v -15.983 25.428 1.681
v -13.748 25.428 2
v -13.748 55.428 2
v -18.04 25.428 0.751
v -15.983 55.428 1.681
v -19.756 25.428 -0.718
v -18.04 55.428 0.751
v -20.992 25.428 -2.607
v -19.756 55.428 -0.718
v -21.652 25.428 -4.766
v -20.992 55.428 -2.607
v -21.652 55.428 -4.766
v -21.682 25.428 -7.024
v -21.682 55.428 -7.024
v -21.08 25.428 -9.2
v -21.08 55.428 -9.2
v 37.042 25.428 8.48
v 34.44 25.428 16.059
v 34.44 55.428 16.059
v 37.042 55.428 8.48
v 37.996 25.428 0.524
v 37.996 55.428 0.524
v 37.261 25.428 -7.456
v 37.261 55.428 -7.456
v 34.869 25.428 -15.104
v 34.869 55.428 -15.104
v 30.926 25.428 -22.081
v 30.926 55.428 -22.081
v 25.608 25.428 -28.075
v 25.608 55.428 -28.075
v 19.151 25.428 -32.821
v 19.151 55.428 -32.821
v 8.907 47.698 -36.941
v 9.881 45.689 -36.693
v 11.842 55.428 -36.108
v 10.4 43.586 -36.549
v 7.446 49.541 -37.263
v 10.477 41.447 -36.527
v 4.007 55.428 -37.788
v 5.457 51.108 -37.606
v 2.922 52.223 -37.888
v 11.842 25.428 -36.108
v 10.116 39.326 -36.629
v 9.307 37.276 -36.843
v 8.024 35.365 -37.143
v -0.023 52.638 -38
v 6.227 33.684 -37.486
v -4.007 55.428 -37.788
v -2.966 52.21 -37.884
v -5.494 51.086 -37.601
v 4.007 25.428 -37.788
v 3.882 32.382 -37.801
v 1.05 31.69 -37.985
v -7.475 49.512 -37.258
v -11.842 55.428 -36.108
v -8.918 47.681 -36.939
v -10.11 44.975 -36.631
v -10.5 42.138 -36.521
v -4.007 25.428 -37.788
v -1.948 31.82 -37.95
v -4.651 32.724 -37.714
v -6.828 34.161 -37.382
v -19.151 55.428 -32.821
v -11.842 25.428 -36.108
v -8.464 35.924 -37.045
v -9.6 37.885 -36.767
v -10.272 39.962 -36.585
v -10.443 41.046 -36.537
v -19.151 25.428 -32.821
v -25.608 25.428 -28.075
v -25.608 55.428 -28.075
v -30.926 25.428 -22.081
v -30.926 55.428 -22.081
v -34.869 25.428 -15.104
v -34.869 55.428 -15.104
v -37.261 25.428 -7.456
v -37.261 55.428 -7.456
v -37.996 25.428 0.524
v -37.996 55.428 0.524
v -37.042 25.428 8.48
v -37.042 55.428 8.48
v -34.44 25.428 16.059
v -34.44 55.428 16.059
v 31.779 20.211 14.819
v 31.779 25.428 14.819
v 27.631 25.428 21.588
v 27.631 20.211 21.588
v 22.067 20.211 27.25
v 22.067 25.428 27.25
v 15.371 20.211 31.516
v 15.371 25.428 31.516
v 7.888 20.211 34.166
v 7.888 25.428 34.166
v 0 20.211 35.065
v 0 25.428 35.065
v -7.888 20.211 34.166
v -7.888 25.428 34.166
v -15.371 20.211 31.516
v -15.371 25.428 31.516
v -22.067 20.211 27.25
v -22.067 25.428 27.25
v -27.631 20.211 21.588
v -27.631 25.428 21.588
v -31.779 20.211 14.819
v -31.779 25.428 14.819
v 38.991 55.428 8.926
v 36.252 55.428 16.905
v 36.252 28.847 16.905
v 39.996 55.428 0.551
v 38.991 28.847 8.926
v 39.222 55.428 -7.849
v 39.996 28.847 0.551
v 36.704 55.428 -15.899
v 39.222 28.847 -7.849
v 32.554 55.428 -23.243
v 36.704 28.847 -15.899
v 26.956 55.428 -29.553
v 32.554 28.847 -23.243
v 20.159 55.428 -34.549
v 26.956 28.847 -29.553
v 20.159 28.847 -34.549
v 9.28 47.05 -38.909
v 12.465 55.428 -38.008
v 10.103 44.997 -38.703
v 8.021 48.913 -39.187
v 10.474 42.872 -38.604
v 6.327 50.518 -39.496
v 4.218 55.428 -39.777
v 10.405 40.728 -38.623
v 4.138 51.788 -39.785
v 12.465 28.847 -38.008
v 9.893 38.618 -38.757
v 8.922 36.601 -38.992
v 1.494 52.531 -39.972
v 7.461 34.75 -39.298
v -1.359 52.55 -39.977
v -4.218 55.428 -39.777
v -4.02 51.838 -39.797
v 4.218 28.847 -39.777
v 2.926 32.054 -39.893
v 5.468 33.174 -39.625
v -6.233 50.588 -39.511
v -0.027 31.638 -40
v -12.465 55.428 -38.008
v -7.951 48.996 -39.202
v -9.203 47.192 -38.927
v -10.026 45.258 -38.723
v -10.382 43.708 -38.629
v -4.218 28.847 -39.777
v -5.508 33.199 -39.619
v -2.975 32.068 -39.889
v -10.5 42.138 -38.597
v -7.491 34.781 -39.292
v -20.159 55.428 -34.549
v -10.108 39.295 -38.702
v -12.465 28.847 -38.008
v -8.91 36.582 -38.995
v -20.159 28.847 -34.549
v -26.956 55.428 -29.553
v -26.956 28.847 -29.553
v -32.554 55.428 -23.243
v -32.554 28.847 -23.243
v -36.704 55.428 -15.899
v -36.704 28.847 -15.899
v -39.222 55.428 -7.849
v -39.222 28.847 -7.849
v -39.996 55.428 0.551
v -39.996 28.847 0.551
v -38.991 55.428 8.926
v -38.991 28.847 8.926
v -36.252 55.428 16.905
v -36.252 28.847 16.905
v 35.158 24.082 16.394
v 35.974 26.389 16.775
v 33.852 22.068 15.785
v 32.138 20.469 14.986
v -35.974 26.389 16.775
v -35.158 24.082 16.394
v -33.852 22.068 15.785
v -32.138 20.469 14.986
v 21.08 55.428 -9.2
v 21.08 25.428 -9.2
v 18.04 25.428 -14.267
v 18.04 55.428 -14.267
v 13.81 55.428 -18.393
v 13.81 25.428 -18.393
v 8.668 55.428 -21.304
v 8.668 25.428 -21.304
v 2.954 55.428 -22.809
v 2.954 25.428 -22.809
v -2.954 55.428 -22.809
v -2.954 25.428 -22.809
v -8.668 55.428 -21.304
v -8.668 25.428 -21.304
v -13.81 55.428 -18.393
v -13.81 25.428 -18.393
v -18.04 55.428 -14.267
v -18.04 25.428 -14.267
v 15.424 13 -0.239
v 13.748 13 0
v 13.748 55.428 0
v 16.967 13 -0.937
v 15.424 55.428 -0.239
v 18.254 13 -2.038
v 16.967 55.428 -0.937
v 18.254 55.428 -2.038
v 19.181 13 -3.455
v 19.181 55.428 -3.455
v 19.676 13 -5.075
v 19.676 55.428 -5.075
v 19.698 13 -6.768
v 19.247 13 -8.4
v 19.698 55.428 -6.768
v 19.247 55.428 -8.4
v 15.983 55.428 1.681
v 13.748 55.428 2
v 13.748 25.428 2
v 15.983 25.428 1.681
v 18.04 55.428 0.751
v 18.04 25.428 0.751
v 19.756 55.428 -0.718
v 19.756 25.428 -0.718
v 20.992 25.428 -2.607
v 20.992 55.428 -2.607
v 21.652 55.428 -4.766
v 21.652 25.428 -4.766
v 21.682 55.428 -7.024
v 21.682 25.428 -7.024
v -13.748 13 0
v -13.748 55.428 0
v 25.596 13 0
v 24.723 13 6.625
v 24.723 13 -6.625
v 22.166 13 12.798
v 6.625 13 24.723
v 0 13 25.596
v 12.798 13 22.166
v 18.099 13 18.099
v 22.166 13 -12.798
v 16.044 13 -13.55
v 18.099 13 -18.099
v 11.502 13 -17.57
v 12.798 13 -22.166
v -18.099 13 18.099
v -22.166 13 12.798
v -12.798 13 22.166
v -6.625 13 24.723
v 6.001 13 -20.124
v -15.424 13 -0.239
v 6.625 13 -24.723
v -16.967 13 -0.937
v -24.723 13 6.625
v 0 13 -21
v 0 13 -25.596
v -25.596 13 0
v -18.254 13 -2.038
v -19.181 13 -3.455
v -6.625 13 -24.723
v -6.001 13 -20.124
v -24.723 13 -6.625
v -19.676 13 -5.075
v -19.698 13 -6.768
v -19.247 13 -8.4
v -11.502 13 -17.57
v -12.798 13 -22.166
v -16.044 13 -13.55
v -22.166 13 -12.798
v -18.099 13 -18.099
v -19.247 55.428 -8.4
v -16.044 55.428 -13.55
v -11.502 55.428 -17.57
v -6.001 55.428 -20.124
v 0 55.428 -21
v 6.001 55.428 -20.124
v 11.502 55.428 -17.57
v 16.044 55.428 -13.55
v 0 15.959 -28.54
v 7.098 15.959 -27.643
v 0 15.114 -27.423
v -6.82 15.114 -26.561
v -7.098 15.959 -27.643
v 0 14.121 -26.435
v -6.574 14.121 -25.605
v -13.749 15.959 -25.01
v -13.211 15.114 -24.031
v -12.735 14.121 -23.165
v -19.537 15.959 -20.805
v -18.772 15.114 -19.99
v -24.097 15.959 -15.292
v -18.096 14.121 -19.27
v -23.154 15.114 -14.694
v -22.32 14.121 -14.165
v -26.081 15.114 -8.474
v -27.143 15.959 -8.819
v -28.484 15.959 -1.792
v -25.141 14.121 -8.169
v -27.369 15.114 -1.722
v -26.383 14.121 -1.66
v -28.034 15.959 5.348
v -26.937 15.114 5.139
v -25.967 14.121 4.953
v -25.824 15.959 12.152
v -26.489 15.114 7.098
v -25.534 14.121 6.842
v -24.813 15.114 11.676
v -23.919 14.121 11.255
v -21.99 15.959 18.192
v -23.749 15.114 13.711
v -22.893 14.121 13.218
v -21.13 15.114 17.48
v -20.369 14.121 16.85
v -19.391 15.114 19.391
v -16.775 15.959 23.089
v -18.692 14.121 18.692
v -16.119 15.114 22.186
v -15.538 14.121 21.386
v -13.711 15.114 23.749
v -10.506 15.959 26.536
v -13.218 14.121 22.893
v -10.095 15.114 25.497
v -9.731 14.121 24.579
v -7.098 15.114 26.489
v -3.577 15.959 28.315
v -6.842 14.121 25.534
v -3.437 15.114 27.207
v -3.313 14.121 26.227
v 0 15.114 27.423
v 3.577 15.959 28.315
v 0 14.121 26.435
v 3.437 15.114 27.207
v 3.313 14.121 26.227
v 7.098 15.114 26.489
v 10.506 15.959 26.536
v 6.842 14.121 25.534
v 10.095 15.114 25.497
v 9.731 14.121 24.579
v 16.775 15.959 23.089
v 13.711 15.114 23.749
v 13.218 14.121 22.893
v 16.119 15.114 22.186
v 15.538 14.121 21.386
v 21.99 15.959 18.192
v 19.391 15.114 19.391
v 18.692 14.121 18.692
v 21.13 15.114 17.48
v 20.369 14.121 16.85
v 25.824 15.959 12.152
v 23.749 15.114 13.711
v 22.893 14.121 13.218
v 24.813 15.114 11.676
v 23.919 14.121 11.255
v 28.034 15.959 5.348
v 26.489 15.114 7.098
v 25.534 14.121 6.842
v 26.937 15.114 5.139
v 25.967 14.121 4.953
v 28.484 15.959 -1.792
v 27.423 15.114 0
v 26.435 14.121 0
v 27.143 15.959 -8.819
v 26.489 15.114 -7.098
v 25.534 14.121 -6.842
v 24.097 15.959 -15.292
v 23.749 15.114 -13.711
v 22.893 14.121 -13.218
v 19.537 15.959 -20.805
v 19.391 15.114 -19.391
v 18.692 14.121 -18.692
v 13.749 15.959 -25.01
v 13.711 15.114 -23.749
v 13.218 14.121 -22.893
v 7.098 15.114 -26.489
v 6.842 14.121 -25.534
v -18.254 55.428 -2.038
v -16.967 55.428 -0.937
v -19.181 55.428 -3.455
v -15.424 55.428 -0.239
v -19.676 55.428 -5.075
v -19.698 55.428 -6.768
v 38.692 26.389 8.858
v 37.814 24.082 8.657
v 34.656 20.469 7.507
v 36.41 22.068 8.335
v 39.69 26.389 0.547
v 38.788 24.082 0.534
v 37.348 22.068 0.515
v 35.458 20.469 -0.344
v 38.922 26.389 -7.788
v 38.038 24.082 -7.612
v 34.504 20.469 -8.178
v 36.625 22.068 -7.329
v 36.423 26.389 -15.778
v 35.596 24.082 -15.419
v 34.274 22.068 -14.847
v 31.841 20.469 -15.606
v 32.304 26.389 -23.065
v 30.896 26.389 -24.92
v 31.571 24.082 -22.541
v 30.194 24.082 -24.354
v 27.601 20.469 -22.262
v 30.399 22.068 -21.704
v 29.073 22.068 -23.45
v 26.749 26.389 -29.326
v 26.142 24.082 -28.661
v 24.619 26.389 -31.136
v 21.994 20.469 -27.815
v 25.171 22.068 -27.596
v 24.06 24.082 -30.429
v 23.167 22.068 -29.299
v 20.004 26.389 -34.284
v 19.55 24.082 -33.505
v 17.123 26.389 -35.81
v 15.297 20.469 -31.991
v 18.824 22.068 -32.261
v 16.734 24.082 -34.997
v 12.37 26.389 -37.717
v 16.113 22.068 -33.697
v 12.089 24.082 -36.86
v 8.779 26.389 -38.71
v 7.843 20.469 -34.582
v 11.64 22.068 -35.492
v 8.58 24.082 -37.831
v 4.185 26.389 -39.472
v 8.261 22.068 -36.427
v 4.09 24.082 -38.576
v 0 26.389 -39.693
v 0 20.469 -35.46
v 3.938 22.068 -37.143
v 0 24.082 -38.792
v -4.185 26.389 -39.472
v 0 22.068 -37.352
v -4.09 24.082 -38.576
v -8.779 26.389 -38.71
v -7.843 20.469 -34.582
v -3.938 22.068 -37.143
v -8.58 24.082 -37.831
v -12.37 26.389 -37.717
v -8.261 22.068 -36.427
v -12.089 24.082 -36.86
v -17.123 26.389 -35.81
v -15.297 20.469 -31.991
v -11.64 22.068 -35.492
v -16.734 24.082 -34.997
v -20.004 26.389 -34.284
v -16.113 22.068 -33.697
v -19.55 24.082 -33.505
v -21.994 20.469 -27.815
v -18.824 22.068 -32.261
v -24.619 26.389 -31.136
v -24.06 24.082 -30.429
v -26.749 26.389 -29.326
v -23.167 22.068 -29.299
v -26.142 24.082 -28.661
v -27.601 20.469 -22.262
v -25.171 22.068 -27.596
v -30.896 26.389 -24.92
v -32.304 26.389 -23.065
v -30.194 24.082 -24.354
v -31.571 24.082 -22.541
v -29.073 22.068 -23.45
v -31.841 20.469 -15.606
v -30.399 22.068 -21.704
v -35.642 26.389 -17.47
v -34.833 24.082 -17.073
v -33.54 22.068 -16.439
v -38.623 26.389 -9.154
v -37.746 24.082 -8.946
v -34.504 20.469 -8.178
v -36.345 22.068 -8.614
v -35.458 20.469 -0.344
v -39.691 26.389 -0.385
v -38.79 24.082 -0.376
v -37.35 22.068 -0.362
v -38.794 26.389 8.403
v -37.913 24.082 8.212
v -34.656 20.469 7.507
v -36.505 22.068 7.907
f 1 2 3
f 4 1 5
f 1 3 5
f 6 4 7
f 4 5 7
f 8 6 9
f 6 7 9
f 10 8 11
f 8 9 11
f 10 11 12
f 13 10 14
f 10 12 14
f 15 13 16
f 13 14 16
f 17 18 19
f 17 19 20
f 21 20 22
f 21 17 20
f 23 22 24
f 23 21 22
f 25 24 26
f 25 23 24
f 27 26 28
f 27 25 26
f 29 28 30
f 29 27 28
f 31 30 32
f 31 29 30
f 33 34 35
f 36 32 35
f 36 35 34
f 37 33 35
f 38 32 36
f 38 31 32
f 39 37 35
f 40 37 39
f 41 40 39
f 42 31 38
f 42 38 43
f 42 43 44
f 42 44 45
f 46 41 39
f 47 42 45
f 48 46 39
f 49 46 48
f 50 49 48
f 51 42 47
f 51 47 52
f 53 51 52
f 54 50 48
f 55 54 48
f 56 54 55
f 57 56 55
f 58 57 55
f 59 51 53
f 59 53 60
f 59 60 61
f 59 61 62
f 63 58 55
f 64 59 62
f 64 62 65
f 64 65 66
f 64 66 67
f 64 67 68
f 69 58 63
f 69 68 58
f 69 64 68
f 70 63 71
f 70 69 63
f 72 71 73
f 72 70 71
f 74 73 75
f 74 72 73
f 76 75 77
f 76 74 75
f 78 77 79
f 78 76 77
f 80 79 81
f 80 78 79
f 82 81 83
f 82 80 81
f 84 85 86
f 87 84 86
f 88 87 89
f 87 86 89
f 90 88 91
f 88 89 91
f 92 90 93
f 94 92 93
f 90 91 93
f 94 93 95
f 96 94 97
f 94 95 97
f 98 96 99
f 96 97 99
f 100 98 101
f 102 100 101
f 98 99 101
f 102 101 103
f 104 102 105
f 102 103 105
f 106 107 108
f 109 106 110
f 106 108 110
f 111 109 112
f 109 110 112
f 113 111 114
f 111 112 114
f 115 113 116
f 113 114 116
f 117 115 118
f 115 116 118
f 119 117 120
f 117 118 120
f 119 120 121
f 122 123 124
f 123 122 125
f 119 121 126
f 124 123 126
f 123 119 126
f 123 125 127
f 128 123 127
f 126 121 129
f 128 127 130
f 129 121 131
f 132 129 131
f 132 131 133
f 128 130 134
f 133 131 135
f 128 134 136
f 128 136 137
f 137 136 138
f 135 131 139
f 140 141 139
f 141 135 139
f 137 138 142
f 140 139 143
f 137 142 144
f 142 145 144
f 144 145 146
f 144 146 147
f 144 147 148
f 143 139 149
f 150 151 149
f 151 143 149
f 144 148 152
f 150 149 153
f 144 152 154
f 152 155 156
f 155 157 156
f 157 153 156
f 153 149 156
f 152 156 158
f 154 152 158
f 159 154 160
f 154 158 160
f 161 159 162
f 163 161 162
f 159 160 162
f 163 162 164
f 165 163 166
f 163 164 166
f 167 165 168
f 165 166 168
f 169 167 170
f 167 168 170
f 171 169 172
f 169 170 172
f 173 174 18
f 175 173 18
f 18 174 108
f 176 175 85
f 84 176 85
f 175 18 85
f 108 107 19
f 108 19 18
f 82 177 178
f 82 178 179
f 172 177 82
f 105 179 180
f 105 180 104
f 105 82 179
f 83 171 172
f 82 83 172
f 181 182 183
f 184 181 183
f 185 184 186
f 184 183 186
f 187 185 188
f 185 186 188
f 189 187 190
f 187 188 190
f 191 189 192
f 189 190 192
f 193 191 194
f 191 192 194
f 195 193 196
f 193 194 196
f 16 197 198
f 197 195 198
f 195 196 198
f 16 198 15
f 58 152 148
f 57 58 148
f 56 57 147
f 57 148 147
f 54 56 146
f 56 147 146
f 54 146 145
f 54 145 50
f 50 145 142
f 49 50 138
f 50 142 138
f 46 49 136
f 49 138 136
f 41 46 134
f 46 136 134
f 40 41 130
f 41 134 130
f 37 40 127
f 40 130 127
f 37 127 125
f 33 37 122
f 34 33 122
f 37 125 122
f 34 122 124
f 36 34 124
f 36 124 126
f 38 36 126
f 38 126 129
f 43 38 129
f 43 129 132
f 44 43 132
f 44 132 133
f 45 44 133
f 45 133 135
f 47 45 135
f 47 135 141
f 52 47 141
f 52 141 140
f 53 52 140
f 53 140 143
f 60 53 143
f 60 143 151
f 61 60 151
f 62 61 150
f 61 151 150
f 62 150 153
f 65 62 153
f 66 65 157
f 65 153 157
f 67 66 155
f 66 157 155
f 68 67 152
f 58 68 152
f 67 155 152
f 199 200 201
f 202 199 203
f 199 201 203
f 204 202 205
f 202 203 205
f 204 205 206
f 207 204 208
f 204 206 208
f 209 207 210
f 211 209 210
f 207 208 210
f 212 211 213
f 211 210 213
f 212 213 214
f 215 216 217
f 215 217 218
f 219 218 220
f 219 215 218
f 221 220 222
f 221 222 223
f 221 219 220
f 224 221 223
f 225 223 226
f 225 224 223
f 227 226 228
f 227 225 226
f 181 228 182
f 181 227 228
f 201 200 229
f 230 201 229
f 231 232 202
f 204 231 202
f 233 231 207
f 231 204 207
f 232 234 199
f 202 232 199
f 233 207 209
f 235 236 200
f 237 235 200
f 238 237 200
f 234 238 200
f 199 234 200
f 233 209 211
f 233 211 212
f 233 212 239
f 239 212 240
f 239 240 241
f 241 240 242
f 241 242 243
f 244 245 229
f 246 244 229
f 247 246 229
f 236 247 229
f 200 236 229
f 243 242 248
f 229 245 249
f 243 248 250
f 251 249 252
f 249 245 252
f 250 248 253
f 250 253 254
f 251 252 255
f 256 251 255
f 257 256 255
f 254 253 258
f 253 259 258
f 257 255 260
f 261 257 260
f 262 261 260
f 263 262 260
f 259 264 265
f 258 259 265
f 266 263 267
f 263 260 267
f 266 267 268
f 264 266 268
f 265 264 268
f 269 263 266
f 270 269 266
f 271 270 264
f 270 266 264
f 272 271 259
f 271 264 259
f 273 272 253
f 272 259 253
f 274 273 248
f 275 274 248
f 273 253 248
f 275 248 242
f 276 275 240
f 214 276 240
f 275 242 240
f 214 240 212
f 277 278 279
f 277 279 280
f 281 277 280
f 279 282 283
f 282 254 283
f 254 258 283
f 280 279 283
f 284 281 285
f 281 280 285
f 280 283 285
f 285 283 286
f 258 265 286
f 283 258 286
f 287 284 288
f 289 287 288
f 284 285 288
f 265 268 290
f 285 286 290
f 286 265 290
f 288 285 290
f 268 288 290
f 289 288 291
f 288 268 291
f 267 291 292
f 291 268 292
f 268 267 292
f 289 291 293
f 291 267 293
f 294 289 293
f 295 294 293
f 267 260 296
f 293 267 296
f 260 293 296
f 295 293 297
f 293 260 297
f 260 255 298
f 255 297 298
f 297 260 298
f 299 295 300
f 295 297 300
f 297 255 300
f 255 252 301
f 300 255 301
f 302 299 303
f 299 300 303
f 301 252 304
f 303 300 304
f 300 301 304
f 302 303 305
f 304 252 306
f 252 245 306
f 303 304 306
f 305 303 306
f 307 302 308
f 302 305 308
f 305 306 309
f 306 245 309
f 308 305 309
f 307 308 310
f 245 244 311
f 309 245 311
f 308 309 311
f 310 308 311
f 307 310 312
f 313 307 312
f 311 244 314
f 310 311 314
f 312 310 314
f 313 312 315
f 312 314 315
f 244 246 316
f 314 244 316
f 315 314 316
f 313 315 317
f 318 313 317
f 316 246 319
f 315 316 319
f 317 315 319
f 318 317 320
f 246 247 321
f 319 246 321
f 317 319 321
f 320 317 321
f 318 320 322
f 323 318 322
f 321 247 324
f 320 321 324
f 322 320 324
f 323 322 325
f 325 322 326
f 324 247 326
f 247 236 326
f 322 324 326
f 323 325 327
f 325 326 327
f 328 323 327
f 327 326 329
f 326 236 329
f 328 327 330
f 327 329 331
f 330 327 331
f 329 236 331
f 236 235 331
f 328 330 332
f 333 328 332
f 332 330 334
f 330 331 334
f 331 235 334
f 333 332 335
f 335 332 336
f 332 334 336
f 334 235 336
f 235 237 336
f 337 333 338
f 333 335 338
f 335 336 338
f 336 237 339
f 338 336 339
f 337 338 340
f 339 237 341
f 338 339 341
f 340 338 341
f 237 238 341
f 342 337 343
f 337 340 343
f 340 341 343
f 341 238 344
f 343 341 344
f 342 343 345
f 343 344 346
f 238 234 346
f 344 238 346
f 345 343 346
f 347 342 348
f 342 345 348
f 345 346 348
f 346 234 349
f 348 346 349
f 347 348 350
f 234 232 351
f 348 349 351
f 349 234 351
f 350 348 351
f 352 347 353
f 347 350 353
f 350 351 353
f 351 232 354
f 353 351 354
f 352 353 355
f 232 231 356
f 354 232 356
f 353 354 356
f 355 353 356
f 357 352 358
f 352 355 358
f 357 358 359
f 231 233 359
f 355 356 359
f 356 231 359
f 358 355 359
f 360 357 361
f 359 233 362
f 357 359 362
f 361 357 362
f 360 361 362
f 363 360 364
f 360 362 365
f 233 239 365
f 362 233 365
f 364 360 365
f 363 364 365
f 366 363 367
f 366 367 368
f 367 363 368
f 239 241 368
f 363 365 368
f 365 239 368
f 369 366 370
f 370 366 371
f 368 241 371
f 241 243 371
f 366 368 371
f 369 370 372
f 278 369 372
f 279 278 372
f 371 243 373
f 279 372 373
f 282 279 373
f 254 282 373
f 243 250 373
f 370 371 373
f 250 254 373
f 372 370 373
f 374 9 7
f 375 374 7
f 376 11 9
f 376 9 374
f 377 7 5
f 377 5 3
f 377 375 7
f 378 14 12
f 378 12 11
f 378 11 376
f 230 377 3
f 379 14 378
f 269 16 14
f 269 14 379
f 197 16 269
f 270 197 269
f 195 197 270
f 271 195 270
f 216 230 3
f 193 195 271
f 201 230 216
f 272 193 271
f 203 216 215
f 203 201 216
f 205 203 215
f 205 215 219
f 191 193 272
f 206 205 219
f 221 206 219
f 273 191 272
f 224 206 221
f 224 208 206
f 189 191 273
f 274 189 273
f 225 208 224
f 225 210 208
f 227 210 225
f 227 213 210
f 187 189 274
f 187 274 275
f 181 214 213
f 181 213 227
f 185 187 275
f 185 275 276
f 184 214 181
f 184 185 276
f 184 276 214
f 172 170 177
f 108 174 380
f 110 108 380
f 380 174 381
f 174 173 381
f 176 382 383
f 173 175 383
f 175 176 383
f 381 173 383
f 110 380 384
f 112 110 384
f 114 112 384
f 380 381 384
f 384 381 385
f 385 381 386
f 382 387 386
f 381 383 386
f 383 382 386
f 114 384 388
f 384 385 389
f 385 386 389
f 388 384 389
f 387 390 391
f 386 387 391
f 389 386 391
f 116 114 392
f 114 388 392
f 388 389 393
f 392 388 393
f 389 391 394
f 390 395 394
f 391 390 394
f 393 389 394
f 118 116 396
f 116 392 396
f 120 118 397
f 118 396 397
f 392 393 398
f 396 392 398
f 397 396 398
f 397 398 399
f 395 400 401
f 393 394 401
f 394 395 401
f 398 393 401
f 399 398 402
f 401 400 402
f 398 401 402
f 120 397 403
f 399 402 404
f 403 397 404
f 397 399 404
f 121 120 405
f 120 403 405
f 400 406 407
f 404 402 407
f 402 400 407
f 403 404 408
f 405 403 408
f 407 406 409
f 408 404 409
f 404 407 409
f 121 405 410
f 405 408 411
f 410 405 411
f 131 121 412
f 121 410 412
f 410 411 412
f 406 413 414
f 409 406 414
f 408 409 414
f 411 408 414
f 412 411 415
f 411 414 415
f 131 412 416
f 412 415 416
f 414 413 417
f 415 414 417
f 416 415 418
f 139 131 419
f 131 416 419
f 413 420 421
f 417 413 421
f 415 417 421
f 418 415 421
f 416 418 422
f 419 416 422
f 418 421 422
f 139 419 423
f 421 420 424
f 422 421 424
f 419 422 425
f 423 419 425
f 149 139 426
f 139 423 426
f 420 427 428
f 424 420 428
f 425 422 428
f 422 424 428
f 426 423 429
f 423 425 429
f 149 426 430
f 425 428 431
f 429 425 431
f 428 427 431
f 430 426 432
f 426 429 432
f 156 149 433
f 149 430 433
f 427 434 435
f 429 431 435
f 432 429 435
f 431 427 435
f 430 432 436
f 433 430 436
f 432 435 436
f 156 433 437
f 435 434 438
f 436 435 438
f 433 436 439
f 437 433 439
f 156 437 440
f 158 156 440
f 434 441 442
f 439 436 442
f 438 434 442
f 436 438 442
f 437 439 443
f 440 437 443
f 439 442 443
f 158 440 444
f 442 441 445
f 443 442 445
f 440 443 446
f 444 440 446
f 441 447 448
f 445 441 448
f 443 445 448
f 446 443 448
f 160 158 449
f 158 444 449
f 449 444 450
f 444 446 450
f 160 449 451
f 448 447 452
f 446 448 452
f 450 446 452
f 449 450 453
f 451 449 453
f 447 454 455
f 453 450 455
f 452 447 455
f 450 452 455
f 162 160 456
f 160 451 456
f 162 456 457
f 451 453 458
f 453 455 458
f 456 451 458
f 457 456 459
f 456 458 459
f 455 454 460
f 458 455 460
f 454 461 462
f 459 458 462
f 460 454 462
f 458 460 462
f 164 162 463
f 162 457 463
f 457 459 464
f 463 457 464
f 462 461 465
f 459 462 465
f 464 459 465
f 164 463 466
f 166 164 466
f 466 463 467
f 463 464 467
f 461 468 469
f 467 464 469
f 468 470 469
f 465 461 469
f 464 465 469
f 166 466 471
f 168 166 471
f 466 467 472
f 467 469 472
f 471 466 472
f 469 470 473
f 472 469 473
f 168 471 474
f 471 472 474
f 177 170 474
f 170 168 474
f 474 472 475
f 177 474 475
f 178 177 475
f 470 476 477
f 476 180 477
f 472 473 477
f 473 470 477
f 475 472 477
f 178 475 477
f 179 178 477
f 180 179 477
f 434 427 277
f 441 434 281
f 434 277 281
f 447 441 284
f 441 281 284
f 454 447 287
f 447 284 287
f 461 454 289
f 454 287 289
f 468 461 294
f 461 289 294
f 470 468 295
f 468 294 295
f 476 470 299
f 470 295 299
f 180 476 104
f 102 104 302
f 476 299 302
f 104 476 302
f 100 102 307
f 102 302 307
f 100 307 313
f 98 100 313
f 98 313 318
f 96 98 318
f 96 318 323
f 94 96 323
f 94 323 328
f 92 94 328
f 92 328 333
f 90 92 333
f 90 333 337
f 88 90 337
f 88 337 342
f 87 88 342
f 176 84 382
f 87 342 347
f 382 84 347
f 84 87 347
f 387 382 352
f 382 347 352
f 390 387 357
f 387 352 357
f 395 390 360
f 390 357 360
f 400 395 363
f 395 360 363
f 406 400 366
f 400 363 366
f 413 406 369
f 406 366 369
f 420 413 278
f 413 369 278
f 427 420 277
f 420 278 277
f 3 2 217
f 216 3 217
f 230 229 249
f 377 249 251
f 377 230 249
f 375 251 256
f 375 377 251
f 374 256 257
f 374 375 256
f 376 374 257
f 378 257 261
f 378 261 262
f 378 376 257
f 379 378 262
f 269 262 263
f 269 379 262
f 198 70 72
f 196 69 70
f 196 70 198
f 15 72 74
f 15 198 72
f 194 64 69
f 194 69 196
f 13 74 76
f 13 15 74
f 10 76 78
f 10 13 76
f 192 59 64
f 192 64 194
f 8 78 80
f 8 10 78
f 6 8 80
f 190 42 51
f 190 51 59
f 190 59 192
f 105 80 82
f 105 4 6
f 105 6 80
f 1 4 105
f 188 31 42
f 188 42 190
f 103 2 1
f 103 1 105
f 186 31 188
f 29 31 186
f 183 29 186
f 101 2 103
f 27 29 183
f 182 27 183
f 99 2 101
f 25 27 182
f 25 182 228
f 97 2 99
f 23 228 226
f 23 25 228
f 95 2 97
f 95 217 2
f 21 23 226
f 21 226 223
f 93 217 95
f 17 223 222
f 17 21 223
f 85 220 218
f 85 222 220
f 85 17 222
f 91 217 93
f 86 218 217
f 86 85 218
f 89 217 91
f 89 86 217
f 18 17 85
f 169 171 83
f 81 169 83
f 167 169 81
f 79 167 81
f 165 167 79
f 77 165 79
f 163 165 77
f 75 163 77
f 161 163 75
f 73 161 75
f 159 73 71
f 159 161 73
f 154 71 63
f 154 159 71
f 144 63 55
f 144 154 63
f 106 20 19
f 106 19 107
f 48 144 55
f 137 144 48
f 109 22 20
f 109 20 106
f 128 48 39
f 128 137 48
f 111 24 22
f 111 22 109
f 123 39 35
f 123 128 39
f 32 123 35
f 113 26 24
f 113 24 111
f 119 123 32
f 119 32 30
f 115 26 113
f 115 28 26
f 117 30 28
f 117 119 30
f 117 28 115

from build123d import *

# Parameters (mm, degrees)
CUT_EXTRUDE3_DEPTH           = 60
CUT_EXTRUDE5_DEPTH           = 2
CUT_EXTRUDE5_DEPTH_BACK      = 30
SKETCH9_R                    = 38
SKETCH9_R_2                  = 23
SKETCH19_W                   = 12
SKETCH19_H                   = 36.5
CUT_REVOLVE2_ANGLE           = 65
CUT_REVOLVE2_OTHER_WAY_ANGLE = 65
SKETCH21_W                   = 3.25
SKETCH21_H                   = 4
BOSS_EXTRUDE3_DEPTH          = 1.35
CIRPATTERN1_COUNT            = 5
CUT_EXTRUDE9_START           = -5
CUT_EXTRUDE9_DEPTH           = 5
SKETCH23_R                   = 10.5
CUT_EXTRUDE10_DEPTH          = 10
SKETCH24_W                   = 15
SKETCH24_H                   = 8
BOSS_EXTRUDE4_DEPTH          = 8
SKETCH26_W                   = 10
SKETCH26_H                   = 6
CUT_EXTRUDE11_DEPTH          = 10
SKETCH27_W                   = 4
SKETCH27_H                   = 5
CUT_EXTRUDE12_DEPTH          = 5
CUT_EXTRUDE14_DEPTH          = 2
CUT_EXTRUDE14_DEPTH_BACK     = 30
SKETCH29_R                   = 1
CUT_EXTRUDE15_DEPTH          = 15
FILLET1_R                    = 6
FILLET2_R                    = 8
INTERSECT2_START             = 55.427876097
INTERSECT2_OUTLINE_W         = 10
INTERSECT2_OUTLINE_H         = 6
INTERSECT2_DEPTH             = 8
INTERSECT2_2_DEPTH           = 13
INTERSECT2_START_2           = 50.427876097
INTERSECT2_3_OUTLINE_W       = 15
INTERSECT2_3_OUTLINE_H       = 8
INTERSECT2_3_OUTLINE_W_2     = 10
INTERSECT2_3_OUTLINE_H_2     = 6
INTERSECT2_3_DEPTH           = 5


# Read off the part's stored shape, not the designer's step: Cut-Extrude9, Intersect2
with BuildPart() as part:
    # Sketch1 → Revolve1 (revolve)
    with BuildSketch(Plane.XY, mode=Mode.PRIVATE) as revolve1_sk:
        with BuildLine():
            Line((0, 63.427876097), (32, 63.427876097))
            ThreePointArc((32, 63.427876097), (37.656854249, 61.084730346), (40, 55.427876097))
            Line((40, 55.427876097), (40, 28.846818009))
            ThreePointArc((40, 28.846818009), (38.792081772, 24.082439968), (35.460140376, 20.469057744))
            Line((35.460140376, 20.469057744), (28.539859624, 15.958818353))
            ThreePointArc((28.539859624, 15.958818353), (25.207918228, 12.345436129), (24, 7.581058088))
            Line((24, 7.581058088), (24, 3.25))
            Line((24, 3.25), (24.35, 3))
            Line((24.35, 3), (24.35, 0))
            Line((24.35, 0), (22.5, 0))
            Line((22.5, 0), (22.5, 12.5))
            ThreePointArc((22.5, 12.5), (22.353553391, 12.853553391), (22, 13))
            Line((22, 13), (0, 13))
            Line((0, 13), (0, 63.427876097))
        make_face()
    revolve(revolve1_sk.sketch.rotate(Axis((0, 0, 0), (0, 1, 0)), 90), axis=Axis((0, 0, 0), (0, 1, 0)))

    # Sketch11 → Cut-Extrude3 (cut)
    with BuildSketch(Plane(origin=(0, 13, 0), x_dir=(-1, 0, 0), z_dir=(0, -1, 0))):
        with BuildLine():
            Line((-21, 0), (21, 0))
            ThreePointArc((21, 0), (0, 21), (-21, 0))
        make_face()
    extrude(amount=-CUT_EXTRUDE3_DEPTH, mode=Mode.SUBTRACT)

    # Sketch9 → Cut-Extrude5 (cut, two sides: drawn at the far end of the back side and taken through both)
    with BuildSketch(Plane(origin=(0, 55.427876097, 0), x_dir=(1, 0, 0), z_dir=(0, 1, 0)).offset(-CUT_EXTRUDE5_DEPTH_BACK)):
        with Locations(Location((0, 0, 0), (0, 0, 270))):
            Circle(SKETCH9_R)
        with Locations(Location((0, 0, 0), (0, 0, 270))):
            Circle(SKETCH9_R_2, mode=Mode.SUBTRACT)
    extrude(amount=CUT_EXTRUDE5_DEPTH + CUT_EXTRUDE5_DEPTH_BACK, mode=Mode.SUBTRACT)

    # Sketch19 → Cut-Revolve2 (revolve, cut)
    with BuildSketch(Plane(origin=(0, 0, 0), x_dir=(0, 0, -1), z_dir=(1, 0, 0))):
        with Locations((-41.064715832, 37.177876097)):
            Rectangle(SKETCH19_W, SKETCH19_H)
    revolve(axis=Axis((0, 0, 0), (0, 1, 0)), revolution_arc=CUT_REVOLVE2_ANGLE, mode=Mode.SUBTRACT)

    # Sketch19 → Cut-Revolve2 other way (revolve, cut)
    with BuildSketch(Plane(origin=(0, 0, 0), x_dir=(0, 0, -1), z_dir=(1, 0, 0))):
        with Locations((-41.064715832, 37.177876097)):
            Rectangle(SKETCH19_W, SKETCH19_H)
    revolve(axis=Axis((0, 0, 0), (0, -1, 0)), revolution_arc=CUT_REVOLVE2_OTHER_WAY_ANGLE, mode=Mode.SUBTRACT)

    # Sketch21 → Boss-Extrude3 (add)
    with BuildSketch(Plane(origin=(0, 0, 22.5), x_dir=(-1, 0, 0), z_dir=(0, 0, -1))):
        with Locations((0, 2)):
            Rectangle(SKETCH21_W, SKETCH21_H)
    boss_extrude3 = extrude(amount=BOSS_EXTRUDE3_DEPTH)

    # CirPattern1: Boss-Extrude3 ×5 about axis
    cirpattern1_axis = Axis((0, 0, 0), (0, 1, 0))
    for i in range(1, CIRPATTERN1_COUNT):
        add(boss_extrude3.rotate(cirpattern1_axis, i * 360 / CIRPATTERN1_COUNT))

    # Cut-Extrude9 outline → Cut-Extrude9 (cut)
    with BuildSketch(Plane(origin=(0, 63.427876097, 0), x_dir=(1, 0, 0), z_dir=(0, 1, 0)).offset(CUT_EXTRUDE9_START)):
        with BuildLine():
            ThreePointArc((40, 0), (0, 40), (-40, 0))
            Line((-40, 0), (-21, 0))
            ThreePointArc((-21, 0), (0, 21), (21, 0))
            Line((21, 0), (40, 0))
        make_face()
    extrude(amount=CUT_EXTRUDE9_DEPTH, mode=Mode.SUBTRACT)

    # Sketch23 → Cut-Extrude10 (cut)
    with BuildSketch(Plane(origin=(0, 0, -40), x_dir=(-1, 0, 0), z_dir=(0, 0, -1))):
        with Locations((0, 42.137876097)):
            Circle(SKETCH23_R)
    extrude(amount=-CUT_EXTRUDE10_DEPTH, mode=Mode.SUBTRACT)

    # Sketch24 → Boss-Extrude4 (add)
    with BuildSketch(Plane(origin=(0, 58.427876097, 0), x_dir=(1, 0, 0), z_dir=(0, 1, 0))):
        with Locations((0, 30)):
            Rectangle(SKETCH24_W, SKETCH24_H)
    extrude(amount=-BOSS_EXTRUDE4_DEPTH)

    # Sketch26 → Cut-Extrude11 (cut)
    with BuildSketch(Plane(origin=(0, 58.427876097, 0), x_dir=(1, 0, 0), z_dir=(0, 1, 0))):
        with Locations((0, 30)):
            Rectangle(SKETCH26_W, SKETCH26_H)
    extrude(amount=-CUT_EXTRUDE11_DEPTH, mode=Mode.SUBTRACT)

    # Sketch27 → Cut-Extrude12 (cut)
    with BuildSketch(Plane(origin=(7.5, 0, 0), x_dir=(0, 0, -1), z_dir=(1, 0, 0))):
        with Locations((30, 53.927876097)):
            Rectangle(SKETCH27_W, SKETCH27_H)
    extrude(amount=-CUT_EXTRUDE12_DEPTH, mode=Mode.SUBTRACT)

    # Sketch28 → Cut-Extrude14 (cut, two sides: drawn at the far end of the back side and taken through both)
    with BuildSketch(Plane(origin=(0, 55.427876097, 0), x_dir=(1, 0, 0), z_dir=(0, 1, 0)).offset(-CUT_EXTRUDE14_DEPTH_BACK)):
        with BuildLine():
            Line((-22.912878475, -2), (22.912878475, -2))
            ThreePointArc((22.912878475, -2), (0, -23), (-22.912878475, -2))
        make_face()
    extrude(amount=CUT_EXTRUDE14_DEPTH + CUT_EXTRUDE14_DEPTH_BACK, mode=Mode.SUBTRACT)

    # Sketch29 → Cut-Extrude15 (cut)
    with BuildSketch(Plane(origin=(0, 0, 0), x_dir=(-1, 0, 0), z_dir=(0, 0, -1))):
        with Locations((-30.416198487, 60.927876097)):
            Circle(SKETCH29_R)
        with Locations((30.416198487, 60.927876097)):
            Circle(SKETCH29_R)
        with Locations((0, 60.927876097)):
            Circle(SKETCH29_R)
    extrude(amount=-CUT_EXTRUDE15_DEPTH, mode=Mode.SUBTRACT)

    # Fillet1
    fillet1_edges = [part.edges().sort_by_distance(p)[0] for p in [
        (21, 35.713938048, 0),
        (-21, 35.713938048, 0),
    ]]
    fillet(fillet1_edges, radius=FILLET1_R)

    # Fillet2
    fillet2_edges = [part.edges().sort_by_distance(p)[0] for p in [
        (-22.912878475, 41.427876097, 2),
        (22.912878475, 41.427876097, 2),
    ]]
    fillet(fillet2_edges, radius=FILLET2_R)

    # Intersect2 outline → Intersect2 (cut)
    with BuildSketch(Plane(origin=(0, 0, 0), x_dir=(1, 0, 0), z_dir=(0, 1, 0)).offset(INTERSECT2_START)):
        Polygon((-42, -15), (-40.906642577, -15), (-42, -15.355253362), (-42, -42), (42, -42), (42, -15.355253362), (40.906642577, -15), (42, -15), (42, 32), (25.257971351, 32), (32.523396625, 42), (-32.523396625, 42), (-25.257971351, 32), (-42, 32), align=None)
        with Locations((0, 30)):
            Rectangle(INTERSECT2_OUTLINE_W, INTERSECT2_OUTLINE_H, mode=Mode.SUBTRACT)
    extrude(amount=INTERSECT2_DEPTH, mode=Mode.SUBTRACT)

    # Intersect2 2 outline → Intersect2 2 (cut)
    with BuildSketch(Plane(origin=(0, 0, 0), x_dir=(1, 0, 0), z_dir=(0, 1, 0))):
        Polygon((-42, 28), (-42, -15), (-40.906642577, -15), (-42, -15.355253362), (-42, -42), (42, -42), (42, -15.355253362), (40.906642577, -15), (42, -15), (42, 28), (7.5, 28), (7.5, 26), (-7.5, 26), (-7.5, 28), align=None)
    extrude(amount=INTERSECT2_2_DEPTH, mode=Mode.SUBTRACT)

    # Intersect2 3 outline → Intersect2 3 (cut)
    with BuildSketch(Plane(origin=(0, 0, 0), x_dir=(1, 0, 0), z_dir=(0, 1, 0)).offset(INTERSECT2_START_2)):
        with Locations((0, 30)):
            Rectangle(INTERSECT2_3_OUTLINE_W, INTERSECT2_3_OUTLINE_H)
        with Locations((0, 30)):
            Rectangle(INTERSECT2_3_OUTLINE_W_2, INTERSECT2_3_OUTLINE_H_2, mode=Mode.SUBTRACT)
    extrude(amount=INTERSECT2_3_DEPTH, mode=Mode.SUBTRACT)


solid = part.part
